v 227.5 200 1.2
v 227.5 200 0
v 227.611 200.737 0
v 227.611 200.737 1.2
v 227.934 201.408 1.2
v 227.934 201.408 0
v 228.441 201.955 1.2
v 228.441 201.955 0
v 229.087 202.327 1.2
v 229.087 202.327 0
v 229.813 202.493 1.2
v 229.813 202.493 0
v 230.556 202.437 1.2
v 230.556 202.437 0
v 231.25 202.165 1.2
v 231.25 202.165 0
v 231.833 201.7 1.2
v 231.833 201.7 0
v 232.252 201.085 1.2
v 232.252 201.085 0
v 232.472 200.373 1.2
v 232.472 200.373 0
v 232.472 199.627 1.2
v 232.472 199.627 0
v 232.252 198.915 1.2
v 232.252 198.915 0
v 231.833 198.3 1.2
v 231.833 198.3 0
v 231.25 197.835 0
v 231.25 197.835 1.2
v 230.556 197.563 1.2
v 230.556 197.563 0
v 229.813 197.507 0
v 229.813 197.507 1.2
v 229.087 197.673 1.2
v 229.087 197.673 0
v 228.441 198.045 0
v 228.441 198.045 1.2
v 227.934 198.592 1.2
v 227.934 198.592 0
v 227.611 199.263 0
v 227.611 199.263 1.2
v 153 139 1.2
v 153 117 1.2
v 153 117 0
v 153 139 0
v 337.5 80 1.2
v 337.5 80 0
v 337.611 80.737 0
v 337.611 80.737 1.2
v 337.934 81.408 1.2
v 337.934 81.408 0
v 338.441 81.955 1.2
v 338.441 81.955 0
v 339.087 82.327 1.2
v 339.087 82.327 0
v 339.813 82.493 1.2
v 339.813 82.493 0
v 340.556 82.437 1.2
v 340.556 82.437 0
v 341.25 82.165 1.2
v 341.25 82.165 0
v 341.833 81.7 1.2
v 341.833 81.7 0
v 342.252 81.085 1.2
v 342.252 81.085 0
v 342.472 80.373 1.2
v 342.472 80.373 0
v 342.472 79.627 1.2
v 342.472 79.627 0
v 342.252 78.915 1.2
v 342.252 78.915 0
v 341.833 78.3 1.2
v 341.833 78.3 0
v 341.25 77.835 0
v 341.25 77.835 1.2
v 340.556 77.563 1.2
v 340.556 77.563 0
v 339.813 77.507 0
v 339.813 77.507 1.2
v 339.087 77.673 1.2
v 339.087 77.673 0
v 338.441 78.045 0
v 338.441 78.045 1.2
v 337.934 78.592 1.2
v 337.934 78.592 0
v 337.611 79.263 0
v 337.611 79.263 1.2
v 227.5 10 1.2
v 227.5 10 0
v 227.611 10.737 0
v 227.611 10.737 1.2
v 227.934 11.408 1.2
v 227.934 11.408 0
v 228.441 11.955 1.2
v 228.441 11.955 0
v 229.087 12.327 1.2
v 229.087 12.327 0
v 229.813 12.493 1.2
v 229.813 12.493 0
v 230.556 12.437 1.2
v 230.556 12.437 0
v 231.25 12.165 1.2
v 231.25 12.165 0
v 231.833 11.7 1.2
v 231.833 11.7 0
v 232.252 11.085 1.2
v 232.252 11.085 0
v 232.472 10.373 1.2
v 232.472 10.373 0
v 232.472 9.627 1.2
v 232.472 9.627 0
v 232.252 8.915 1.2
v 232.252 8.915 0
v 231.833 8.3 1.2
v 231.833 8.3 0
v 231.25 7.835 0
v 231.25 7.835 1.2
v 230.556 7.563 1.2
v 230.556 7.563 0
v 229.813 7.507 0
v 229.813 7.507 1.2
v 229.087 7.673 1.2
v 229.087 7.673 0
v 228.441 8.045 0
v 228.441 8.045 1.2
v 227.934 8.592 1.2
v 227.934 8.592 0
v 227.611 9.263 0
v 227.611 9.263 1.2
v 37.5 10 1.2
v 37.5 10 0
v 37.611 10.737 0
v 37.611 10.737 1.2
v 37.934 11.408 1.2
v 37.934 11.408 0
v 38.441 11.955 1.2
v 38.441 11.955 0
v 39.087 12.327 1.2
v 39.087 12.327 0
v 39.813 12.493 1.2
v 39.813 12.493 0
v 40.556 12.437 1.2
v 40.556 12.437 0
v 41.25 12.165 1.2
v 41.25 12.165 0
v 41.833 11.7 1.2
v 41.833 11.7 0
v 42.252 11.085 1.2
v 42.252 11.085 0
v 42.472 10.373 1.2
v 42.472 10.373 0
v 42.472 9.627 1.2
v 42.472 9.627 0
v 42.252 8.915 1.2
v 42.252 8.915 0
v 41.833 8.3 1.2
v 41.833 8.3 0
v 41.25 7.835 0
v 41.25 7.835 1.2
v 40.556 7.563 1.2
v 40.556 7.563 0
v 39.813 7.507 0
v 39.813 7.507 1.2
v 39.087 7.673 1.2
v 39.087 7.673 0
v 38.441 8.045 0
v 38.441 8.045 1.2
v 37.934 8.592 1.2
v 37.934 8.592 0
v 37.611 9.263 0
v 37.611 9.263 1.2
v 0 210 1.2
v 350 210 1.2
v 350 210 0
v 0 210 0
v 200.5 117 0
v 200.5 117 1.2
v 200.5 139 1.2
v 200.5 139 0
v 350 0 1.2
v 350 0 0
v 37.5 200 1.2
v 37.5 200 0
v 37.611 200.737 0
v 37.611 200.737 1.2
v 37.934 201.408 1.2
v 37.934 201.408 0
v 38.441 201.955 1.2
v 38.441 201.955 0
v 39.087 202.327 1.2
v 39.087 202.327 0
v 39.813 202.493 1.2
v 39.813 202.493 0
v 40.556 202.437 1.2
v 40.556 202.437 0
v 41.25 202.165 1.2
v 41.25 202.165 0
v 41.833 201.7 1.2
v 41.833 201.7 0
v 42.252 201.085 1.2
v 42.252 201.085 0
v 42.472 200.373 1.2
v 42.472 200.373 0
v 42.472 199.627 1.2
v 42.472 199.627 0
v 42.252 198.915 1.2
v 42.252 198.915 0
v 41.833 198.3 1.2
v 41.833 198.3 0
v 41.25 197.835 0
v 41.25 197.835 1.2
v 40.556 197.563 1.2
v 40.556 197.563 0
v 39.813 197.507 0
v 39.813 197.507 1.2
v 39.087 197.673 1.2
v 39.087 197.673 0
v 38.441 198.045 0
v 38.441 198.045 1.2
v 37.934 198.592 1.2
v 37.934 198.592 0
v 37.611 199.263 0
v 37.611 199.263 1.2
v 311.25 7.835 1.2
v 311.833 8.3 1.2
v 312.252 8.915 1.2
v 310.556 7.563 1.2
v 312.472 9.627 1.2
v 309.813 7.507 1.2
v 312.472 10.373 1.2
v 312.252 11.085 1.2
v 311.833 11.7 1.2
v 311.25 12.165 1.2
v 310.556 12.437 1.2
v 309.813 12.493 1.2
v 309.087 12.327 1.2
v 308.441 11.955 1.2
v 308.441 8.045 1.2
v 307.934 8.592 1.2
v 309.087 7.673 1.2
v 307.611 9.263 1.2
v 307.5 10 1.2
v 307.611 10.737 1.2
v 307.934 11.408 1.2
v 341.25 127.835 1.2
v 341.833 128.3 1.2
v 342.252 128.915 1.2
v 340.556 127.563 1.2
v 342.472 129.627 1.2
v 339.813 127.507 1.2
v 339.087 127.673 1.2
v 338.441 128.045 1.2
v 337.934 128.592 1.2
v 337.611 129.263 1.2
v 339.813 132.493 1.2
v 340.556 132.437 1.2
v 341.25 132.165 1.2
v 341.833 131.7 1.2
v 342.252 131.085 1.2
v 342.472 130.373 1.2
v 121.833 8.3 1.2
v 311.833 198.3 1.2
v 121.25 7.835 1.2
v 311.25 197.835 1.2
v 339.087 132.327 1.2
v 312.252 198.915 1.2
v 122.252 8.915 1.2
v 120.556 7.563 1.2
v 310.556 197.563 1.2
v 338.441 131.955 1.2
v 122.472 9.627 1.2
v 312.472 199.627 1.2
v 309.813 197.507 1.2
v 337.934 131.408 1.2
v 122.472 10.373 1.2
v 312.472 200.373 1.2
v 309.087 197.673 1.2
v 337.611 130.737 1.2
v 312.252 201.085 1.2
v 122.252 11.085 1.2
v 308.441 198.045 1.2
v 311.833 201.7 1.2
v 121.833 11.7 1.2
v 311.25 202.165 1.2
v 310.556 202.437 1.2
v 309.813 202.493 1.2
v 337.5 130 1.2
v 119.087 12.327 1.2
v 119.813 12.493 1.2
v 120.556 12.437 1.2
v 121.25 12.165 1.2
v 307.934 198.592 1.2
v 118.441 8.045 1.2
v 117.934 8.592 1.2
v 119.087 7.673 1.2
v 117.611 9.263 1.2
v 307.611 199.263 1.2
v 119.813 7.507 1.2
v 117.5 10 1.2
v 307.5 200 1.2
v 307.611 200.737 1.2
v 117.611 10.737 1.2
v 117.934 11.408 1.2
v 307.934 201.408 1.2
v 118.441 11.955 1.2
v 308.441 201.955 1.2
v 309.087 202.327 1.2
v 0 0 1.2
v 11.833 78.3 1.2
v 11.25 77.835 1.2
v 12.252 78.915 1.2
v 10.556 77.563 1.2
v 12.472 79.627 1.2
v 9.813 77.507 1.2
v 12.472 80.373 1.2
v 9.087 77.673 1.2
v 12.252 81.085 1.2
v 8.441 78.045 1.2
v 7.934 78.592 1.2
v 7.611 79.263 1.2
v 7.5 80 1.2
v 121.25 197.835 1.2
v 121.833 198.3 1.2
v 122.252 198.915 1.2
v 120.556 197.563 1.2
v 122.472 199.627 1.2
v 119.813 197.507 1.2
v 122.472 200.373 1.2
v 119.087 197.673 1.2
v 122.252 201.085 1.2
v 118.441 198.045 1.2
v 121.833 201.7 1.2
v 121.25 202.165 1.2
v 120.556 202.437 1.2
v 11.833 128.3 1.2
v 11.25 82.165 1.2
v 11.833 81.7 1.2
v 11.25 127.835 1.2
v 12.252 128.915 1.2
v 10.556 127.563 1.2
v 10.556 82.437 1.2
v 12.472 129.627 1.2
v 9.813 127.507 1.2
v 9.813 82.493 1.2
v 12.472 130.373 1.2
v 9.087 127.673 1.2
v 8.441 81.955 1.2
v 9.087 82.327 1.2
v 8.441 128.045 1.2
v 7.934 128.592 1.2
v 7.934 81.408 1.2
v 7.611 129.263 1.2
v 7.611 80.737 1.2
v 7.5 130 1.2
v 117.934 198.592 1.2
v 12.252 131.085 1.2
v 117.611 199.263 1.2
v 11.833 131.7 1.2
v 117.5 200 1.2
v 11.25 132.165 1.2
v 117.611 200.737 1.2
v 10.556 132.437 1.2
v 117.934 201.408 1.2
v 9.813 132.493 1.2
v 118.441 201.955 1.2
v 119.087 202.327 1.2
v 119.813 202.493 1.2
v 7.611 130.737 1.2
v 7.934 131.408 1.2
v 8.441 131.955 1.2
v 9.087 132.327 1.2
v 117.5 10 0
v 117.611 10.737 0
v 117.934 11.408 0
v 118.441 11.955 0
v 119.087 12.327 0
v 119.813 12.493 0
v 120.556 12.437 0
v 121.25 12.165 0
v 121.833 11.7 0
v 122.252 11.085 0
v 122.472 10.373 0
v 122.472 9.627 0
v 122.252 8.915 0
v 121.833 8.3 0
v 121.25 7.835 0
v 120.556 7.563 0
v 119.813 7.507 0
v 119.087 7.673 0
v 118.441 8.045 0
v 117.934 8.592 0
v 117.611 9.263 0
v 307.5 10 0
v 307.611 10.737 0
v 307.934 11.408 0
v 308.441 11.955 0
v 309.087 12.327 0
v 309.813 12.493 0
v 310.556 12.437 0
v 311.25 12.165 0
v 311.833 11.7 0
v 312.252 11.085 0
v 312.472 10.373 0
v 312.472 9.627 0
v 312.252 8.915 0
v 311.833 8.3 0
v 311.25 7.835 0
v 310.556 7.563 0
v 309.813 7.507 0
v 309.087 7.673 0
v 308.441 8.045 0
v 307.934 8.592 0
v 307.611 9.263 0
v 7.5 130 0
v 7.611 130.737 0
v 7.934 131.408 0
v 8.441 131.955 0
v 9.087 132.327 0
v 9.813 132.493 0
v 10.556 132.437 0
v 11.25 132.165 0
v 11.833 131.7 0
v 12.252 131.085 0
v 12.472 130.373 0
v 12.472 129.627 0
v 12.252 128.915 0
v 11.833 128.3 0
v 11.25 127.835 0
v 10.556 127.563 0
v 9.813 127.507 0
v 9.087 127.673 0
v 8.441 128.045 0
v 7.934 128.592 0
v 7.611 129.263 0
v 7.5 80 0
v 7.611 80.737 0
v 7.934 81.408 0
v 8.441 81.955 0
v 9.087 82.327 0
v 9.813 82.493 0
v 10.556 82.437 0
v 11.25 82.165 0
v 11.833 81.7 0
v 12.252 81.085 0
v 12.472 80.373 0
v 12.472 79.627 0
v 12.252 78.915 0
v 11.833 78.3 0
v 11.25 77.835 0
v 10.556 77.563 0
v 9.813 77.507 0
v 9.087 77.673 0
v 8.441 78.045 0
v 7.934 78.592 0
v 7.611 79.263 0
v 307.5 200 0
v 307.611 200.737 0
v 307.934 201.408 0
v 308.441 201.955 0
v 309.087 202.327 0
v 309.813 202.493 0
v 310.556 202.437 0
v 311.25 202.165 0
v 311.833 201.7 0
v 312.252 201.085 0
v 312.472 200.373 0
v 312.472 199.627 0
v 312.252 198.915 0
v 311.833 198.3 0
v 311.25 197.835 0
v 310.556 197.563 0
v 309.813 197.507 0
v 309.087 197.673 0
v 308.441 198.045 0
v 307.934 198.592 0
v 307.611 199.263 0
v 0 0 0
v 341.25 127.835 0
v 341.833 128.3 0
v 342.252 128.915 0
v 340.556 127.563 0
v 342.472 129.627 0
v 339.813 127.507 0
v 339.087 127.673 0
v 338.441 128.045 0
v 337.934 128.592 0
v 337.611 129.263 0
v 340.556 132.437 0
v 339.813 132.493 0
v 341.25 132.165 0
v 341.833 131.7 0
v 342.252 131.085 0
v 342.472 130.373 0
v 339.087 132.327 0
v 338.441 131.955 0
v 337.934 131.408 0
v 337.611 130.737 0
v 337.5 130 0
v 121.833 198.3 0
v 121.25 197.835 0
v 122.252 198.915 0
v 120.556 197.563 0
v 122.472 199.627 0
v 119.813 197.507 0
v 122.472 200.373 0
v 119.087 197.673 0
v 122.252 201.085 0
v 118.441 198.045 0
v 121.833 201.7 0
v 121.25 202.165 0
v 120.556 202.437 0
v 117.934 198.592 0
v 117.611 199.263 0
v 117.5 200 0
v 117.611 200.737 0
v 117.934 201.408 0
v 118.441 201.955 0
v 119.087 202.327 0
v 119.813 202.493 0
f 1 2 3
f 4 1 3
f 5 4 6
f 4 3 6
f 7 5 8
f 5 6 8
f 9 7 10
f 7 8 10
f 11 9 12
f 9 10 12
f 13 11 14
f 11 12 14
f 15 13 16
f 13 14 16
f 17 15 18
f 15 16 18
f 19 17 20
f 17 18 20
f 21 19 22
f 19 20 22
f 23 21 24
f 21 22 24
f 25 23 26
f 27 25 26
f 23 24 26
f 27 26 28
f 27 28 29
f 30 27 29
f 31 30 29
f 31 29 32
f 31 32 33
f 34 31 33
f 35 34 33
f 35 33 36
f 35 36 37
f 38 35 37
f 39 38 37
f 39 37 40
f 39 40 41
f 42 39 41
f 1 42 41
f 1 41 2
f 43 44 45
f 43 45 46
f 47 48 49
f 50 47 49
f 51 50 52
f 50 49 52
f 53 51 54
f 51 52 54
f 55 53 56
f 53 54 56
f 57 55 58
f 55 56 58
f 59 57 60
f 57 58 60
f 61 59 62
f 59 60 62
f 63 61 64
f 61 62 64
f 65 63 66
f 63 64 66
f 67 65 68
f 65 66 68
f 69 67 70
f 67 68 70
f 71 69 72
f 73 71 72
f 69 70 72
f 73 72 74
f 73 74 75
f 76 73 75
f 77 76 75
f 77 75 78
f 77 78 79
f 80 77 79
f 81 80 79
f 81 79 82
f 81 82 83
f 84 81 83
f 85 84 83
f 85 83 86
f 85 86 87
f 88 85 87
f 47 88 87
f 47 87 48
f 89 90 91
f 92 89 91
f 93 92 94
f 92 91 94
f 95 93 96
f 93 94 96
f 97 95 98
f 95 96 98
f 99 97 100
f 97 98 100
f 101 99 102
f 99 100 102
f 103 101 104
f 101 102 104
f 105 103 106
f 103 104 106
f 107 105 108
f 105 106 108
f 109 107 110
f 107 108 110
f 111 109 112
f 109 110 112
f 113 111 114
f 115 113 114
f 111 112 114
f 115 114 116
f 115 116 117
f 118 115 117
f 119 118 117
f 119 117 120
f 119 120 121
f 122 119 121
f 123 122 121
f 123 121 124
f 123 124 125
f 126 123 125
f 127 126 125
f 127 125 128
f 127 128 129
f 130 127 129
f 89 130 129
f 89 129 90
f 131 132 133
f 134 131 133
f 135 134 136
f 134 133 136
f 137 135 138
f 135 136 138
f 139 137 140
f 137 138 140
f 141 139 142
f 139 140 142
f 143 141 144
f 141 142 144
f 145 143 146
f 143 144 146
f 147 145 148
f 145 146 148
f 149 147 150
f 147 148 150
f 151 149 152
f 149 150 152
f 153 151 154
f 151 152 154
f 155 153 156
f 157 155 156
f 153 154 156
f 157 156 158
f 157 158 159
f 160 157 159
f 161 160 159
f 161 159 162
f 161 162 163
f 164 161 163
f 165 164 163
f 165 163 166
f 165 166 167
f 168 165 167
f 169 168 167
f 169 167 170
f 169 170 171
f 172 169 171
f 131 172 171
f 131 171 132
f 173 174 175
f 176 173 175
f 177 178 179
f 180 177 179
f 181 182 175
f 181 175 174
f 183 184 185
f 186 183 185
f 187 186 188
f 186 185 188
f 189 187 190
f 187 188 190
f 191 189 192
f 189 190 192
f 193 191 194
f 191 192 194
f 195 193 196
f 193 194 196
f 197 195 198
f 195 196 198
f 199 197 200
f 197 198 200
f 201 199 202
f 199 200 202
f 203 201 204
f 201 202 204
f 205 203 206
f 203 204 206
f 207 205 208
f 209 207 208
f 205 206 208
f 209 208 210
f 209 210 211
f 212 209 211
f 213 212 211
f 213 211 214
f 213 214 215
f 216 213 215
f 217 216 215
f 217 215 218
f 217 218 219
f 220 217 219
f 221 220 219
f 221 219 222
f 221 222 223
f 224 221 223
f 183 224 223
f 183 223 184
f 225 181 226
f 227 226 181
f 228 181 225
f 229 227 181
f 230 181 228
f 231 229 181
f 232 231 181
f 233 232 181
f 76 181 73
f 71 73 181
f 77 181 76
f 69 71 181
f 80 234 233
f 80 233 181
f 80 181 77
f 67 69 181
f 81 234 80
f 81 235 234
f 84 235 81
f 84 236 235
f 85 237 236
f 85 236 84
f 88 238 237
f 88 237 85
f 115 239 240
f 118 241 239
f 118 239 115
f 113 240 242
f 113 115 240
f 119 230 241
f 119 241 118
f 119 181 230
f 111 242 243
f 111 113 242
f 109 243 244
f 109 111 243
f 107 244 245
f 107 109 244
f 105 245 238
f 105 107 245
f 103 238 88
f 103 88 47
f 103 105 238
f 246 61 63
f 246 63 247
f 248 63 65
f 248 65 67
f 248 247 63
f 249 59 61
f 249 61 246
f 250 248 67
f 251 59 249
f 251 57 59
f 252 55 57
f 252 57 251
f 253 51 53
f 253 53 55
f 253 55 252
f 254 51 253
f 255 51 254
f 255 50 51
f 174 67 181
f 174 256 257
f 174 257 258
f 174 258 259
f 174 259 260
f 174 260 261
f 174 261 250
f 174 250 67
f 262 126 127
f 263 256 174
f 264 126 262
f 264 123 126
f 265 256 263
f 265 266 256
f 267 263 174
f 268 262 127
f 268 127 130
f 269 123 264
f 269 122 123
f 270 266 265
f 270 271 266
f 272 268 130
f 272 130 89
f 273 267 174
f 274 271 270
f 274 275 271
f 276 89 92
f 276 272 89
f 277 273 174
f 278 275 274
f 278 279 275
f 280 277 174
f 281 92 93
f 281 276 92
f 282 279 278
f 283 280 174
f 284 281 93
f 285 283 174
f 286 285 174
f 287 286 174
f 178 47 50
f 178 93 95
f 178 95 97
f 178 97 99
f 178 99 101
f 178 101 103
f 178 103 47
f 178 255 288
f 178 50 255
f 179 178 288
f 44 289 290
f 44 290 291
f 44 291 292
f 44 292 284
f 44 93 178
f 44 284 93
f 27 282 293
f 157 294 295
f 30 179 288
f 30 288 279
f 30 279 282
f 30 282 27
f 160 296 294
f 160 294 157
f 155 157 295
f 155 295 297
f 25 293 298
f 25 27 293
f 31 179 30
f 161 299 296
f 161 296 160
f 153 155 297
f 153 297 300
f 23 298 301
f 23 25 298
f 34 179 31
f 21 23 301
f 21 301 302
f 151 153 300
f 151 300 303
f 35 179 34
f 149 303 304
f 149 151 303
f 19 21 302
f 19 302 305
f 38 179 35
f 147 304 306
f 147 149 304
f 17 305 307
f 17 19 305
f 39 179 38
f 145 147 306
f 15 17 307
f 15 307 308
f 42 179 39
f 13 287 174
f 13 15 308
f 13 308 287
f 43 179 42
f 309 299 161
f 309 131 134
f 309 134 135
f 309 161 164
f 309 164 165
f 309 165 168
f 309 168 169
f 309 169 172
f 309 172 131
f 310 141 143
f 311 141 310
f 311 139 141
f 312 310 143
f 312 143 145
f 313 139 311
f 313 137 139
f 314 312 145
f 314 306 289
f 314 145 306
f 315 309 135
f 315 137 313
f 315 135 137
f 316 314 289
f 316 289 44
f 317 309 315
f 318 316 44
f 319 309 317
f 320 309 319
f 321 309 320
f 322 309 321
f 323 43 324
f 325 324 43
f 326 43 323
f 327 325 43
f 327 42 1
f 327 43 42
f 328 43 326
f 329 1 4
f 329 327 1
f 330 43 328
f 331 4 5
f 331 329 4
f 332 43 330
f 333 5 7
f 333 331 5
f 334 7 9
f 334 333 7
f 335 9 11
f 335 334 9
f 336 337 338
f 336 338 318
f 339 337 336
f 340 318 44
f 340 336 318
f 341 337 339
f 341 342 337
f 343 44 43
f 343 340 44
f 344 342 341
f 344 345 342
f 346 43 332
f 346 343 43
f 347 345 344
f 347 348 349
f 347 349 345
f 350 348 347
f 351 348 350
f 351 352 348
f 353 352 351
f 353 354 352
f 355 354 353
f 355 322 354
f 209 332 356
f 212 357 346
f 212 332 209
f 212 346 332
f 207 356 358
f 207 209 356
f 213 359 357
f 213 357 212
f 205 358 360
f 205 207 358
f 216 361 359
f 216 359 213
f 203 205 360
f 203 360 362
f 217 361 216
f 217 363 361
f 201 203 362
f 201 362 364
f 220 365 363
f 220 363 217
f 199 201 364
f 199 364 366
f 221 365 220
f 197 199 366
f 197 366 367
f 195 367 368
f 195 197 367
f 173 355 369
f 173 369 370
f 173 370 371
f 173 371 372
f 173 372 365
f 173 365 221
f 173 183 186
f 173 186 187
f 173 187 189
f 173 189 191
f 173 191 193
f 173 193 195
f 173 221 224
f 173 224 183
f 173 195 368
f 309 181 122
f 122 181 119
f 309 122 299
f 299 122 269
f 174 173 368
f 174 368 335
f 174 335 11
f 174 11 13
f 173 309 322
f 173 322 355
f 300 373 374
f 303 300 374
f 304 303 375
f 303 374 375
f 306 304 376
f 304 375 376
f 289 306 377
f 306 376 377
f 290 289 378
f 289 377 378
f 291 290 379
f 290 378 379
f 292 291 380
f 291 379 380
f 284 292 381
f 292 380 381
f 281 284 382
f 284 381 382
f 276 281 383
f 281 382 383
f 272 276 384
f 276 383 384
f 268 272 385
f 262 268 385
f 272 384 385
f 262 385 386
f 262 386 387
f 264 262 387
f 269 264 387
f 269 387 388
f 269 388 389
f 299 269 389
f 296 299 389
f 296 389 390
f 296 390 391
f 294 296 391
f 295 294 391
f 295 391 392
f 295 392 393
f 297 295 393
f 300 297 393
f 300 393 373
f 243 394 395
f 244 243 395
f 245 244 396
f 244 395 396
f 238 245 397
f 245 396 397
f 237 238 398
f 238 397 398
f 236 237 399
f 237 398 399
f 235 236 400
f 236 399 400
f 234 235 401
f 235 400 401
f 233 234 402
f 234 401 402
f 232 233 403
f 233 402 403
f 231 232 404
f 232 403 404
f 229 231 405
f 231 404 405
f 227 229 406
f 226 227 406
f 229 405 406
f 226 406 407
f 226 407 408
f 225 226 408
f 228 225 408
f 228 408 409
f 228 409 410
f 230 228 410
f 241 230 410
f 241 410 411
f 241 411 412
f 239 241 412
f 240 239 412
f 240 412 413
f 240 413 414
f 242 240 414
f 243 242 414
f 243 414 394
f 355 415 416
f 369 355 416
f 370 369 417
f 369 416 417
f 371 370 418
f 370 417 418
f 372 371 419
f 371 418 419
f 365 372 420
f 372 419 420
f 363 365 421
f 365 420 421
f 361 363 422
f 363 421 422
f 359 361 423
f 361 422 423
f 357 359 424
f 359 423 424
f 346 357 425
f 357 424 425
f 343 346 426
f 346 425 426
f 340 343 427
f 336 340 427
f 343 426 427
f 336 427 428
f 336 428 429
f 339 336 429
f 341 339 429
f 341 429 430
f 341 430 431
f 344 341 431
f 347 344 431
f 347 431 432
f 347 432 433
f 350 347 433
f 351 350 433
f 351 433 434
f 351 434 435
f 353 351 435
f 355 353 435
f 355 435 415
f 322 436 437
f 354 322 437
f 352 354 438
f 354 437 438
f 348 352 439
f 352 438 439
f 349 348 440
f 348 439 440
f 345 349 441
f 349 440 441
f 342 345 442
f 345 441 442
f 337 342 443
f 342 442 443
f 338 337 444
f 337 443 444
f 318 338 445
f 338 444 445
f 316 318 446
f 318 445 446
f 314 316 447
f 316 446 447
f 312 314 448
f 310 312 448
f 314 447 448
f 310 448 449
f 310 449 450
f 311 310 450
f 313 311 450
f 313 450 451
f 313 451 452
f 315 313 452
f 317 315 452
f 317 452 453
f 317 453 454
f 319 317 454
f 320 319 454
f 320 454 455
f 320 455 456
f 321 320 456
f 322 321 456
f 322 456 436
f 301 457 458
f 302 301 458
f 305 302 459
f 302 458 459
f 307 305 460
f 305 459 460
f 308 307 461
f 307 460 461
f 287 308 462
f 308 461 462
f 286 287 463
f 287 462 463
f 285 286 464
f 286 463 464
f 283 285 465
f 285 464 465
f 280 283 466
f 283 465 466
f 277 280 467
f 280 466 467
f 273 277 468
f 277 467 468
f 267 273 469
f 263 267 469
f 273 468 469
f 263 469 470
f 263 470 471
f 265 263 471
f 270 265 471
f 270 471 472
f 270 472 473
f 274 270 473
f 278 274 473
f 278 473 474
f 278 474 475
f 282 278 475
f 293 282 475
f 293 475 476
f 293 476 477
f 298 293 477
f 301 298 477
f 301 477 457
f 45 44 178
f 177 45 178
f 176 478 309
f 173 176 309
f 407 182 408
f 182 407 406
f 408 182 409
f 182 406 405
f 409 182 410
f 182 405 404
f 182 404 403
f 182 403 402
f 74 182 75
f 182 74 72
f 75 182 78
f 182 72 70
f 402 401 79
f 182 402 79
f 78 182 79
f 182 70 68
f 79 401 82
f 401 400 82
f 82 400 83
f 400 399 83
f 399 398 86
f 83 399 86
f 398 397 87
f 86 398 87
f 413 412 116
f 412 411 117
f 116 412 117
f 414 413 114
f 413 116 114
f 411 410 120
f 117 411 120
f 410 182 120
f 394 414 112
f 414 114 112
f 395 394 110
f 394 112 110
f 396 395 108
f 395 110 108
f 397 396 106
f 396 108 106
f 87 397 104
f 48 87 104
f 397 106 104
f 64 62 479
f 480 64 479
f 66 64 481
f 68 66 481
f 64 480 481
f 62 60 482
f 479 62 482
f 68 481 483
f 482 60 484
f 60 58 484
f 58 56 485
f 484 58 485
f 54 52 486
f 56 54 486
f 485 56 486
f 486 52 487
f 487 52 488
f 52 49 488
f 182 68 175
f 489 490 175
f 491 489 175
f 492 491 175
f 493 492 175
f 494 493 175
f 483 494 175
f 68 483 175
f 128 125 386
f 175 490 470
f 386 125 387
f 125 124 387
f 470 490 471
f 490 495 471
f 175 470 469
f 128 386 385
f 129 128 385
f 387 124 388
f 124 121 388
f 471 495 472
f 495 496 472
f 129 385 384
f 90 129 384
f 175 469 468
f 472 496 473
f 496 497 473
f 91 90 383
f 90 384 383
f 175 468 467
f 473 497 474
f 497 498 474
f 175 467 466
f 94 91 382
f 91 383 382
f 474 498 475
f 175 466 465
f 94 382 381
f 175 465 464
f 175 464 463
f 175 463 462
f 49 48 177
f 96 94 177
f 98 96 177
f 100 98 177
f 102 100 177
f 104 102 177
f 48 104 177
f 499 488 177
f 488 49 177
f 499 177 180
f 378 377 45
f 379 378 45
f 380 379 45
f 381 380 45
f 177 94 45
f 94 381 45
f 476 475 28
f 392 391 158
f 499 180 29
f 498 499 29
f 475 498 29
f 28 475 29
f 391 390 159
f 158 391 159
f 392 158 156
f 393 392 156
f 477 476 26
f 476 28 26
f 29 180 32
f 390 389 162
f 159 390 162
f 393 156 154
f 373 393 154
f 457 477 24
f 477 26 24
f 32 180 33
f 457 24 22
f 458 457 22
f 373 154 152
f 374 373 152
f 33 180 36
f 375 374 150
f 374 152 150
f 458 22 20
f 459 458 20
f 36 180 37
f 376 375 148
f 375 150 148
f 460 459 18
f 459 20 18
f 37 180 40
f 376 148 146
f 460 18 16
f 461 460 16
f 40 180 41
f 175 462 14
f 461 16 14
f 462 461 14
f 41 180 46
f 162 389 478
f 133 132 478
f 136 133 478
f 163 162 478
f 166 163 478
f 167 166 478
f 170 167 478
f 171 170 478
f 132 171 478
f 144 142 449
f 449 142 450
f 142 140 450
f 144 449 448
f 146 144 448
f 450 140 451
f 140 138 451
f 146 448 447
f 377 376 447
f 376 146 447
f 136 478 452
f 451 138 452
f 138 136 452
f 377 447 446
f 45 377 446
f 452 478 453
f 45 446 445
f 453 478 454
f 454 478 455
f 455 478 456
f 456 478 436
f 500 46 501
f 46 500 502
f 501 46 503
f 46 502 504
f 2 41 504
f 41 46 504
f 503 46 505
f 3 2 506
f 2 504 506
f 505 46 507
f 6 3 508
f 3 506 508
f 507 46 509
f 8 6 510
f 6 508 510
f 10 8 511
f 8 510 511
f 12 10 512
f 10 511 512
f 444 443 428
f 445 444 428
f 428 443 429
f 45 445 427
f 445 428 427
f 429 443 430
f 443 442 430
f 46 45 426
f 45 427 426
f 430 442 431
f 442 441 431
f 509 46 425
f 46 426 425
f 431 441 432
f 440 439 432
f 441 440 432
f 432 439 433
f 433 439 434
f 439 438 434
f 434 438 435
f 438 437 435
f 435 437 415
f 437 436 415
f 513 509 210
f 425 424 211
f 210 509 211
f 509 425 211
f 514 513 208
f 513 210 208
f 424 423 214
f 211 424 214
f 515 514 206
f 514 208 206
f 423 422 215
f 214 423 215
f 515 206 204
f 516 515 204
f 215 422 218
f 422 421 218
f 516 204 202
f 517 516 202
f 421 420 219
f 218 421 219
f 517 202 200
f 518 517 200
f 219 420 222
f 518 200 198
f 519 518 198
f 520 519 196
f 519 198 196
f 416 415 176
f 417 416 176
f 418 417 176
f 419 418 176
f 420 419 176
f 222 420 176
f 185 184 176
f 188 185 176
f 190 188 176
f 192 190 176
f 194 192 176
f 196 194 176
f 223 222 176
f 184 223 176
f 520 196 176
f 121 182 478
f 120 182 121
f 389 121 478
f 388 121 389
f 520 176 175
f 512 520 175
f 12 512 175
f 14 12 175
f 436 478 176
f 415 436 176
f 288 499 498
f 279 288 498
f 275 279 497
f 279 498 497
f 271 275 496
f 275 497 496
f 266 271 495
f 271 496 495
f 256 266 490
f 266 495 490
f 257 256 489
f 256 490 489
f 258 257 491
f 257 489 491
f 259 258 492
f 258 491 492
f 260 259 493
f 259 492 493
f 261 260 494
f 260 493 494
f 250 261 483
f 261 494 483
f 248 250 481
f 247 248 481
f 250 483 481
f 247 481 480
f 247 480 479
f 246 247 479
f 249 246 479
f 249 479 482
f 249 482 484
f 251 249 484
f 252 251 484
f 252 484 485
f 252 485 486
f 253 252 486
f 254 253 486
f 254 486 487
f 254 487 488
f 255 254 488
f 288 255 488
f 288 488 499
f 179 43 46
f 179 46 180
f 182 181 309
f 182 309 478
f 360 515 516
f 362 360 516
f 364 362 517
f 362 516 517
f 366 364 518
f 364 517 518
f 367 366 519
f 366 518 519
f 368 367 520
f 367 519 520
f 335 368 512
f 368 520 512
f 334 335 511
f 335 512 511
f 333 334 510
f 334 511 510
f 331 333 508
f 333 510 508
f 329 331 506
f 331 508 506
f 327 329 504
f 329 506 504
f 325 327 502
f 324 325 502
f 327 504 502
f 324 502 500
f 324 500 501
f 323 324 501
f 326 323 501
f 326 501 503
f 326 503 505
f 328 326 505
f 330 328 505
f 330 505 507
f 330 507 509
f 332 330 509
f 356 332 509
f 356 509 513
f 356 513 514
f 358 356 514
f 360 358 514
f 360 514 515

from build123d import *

# Parameters (mm, degrees)
SURFACE_EXTRUDE1_1_DEPTH = 350
THICKEN1_T1              = 1.2
SKETCH2_W                = 47.5
SKETCH2_H                = 22
CUT_EXTRUDE1_DEPTH       = 10
SKETCH3_R                = 2.5
CUT_EXTRUDE2_DEPTH       = 10


with BuildPart() as body_1:
    # Surface-Extrude1: a surface, the sketch's curves swept straight by 350 mm
    with BuildLine(Plane(origin=(0, 0, 0), x_dir=(0, 0, -1), z_dir=(1, 0, 0)), mode=Mode.PRIVATE) as surface_extrude1_1_path:
        Line((0, 0), (0, 210))
    surface_extrude1_1 = Shell.extrude(surface_extrude1_1_path.wire(), (1 * SURFACE_EXTRUDE1_1_DEPTH, 0 * SURFACE_EXTRUDE1_1_DEPTH, 0 * SURFACE_EXTRUDE1_1_DEPTH))
    add(Solid.thicken(surface_extrude1_1, THICKEN1_T1))

    # Sketch2 → Cut-Extrude1 (cut)
    with BuildSketch(Plane.XY.offset(1.2)):
        with Locations((176.75, 128)):
            Rectangle(SKETCH2_W, SKETCH2_H)
    extrude(amount=-CUT_EXTRUDE1_DEPTH, mode=Mode.SUBTRACT)

    # Sketch3 → Cut-Extrude2 (cut)
    with BuildSketch(Plane(origin=(0, 0, 0), x_dir=(-1, 0, 0), z_dir=(0, 0, -1))):
        with Locations((-310, 200)):
            Circle(SKETCH3_R)
        with Locations((-230, 200)):
            Circle(SKETCH3_R)
        with Locations((-340, 130)):
            Circle(SKETCH3_R)
        with Locations((-10, 130)):
            Circle(SKETCH3_R)
        with Locations((-120, 200)):
            Circle(SKETCH3_R)
        with Locations((-40, 200)):
            Circle(SKETCH3_R)
        with Locations((-10, 80)):
            Circle(SKETCH3_R)
        with Locations((-40, 10)):
            Circle(SKETCH3_R)
        with Locations((-120, 10)):
            Circle(SKETCH3_R)
        with Locations((-230, 10)):
            Circle(SKETCH3_R)
        with Locations((-310, 10)):
            Circle(SKETCH3_R)
        with Locations((-340, 80)):
            Circle(SKETCH3_R)
    extrude(amount=-CUT_EXTRUDE2_DEPTH, mode=Mode.SUBTRACT)


solid = body_1.part
